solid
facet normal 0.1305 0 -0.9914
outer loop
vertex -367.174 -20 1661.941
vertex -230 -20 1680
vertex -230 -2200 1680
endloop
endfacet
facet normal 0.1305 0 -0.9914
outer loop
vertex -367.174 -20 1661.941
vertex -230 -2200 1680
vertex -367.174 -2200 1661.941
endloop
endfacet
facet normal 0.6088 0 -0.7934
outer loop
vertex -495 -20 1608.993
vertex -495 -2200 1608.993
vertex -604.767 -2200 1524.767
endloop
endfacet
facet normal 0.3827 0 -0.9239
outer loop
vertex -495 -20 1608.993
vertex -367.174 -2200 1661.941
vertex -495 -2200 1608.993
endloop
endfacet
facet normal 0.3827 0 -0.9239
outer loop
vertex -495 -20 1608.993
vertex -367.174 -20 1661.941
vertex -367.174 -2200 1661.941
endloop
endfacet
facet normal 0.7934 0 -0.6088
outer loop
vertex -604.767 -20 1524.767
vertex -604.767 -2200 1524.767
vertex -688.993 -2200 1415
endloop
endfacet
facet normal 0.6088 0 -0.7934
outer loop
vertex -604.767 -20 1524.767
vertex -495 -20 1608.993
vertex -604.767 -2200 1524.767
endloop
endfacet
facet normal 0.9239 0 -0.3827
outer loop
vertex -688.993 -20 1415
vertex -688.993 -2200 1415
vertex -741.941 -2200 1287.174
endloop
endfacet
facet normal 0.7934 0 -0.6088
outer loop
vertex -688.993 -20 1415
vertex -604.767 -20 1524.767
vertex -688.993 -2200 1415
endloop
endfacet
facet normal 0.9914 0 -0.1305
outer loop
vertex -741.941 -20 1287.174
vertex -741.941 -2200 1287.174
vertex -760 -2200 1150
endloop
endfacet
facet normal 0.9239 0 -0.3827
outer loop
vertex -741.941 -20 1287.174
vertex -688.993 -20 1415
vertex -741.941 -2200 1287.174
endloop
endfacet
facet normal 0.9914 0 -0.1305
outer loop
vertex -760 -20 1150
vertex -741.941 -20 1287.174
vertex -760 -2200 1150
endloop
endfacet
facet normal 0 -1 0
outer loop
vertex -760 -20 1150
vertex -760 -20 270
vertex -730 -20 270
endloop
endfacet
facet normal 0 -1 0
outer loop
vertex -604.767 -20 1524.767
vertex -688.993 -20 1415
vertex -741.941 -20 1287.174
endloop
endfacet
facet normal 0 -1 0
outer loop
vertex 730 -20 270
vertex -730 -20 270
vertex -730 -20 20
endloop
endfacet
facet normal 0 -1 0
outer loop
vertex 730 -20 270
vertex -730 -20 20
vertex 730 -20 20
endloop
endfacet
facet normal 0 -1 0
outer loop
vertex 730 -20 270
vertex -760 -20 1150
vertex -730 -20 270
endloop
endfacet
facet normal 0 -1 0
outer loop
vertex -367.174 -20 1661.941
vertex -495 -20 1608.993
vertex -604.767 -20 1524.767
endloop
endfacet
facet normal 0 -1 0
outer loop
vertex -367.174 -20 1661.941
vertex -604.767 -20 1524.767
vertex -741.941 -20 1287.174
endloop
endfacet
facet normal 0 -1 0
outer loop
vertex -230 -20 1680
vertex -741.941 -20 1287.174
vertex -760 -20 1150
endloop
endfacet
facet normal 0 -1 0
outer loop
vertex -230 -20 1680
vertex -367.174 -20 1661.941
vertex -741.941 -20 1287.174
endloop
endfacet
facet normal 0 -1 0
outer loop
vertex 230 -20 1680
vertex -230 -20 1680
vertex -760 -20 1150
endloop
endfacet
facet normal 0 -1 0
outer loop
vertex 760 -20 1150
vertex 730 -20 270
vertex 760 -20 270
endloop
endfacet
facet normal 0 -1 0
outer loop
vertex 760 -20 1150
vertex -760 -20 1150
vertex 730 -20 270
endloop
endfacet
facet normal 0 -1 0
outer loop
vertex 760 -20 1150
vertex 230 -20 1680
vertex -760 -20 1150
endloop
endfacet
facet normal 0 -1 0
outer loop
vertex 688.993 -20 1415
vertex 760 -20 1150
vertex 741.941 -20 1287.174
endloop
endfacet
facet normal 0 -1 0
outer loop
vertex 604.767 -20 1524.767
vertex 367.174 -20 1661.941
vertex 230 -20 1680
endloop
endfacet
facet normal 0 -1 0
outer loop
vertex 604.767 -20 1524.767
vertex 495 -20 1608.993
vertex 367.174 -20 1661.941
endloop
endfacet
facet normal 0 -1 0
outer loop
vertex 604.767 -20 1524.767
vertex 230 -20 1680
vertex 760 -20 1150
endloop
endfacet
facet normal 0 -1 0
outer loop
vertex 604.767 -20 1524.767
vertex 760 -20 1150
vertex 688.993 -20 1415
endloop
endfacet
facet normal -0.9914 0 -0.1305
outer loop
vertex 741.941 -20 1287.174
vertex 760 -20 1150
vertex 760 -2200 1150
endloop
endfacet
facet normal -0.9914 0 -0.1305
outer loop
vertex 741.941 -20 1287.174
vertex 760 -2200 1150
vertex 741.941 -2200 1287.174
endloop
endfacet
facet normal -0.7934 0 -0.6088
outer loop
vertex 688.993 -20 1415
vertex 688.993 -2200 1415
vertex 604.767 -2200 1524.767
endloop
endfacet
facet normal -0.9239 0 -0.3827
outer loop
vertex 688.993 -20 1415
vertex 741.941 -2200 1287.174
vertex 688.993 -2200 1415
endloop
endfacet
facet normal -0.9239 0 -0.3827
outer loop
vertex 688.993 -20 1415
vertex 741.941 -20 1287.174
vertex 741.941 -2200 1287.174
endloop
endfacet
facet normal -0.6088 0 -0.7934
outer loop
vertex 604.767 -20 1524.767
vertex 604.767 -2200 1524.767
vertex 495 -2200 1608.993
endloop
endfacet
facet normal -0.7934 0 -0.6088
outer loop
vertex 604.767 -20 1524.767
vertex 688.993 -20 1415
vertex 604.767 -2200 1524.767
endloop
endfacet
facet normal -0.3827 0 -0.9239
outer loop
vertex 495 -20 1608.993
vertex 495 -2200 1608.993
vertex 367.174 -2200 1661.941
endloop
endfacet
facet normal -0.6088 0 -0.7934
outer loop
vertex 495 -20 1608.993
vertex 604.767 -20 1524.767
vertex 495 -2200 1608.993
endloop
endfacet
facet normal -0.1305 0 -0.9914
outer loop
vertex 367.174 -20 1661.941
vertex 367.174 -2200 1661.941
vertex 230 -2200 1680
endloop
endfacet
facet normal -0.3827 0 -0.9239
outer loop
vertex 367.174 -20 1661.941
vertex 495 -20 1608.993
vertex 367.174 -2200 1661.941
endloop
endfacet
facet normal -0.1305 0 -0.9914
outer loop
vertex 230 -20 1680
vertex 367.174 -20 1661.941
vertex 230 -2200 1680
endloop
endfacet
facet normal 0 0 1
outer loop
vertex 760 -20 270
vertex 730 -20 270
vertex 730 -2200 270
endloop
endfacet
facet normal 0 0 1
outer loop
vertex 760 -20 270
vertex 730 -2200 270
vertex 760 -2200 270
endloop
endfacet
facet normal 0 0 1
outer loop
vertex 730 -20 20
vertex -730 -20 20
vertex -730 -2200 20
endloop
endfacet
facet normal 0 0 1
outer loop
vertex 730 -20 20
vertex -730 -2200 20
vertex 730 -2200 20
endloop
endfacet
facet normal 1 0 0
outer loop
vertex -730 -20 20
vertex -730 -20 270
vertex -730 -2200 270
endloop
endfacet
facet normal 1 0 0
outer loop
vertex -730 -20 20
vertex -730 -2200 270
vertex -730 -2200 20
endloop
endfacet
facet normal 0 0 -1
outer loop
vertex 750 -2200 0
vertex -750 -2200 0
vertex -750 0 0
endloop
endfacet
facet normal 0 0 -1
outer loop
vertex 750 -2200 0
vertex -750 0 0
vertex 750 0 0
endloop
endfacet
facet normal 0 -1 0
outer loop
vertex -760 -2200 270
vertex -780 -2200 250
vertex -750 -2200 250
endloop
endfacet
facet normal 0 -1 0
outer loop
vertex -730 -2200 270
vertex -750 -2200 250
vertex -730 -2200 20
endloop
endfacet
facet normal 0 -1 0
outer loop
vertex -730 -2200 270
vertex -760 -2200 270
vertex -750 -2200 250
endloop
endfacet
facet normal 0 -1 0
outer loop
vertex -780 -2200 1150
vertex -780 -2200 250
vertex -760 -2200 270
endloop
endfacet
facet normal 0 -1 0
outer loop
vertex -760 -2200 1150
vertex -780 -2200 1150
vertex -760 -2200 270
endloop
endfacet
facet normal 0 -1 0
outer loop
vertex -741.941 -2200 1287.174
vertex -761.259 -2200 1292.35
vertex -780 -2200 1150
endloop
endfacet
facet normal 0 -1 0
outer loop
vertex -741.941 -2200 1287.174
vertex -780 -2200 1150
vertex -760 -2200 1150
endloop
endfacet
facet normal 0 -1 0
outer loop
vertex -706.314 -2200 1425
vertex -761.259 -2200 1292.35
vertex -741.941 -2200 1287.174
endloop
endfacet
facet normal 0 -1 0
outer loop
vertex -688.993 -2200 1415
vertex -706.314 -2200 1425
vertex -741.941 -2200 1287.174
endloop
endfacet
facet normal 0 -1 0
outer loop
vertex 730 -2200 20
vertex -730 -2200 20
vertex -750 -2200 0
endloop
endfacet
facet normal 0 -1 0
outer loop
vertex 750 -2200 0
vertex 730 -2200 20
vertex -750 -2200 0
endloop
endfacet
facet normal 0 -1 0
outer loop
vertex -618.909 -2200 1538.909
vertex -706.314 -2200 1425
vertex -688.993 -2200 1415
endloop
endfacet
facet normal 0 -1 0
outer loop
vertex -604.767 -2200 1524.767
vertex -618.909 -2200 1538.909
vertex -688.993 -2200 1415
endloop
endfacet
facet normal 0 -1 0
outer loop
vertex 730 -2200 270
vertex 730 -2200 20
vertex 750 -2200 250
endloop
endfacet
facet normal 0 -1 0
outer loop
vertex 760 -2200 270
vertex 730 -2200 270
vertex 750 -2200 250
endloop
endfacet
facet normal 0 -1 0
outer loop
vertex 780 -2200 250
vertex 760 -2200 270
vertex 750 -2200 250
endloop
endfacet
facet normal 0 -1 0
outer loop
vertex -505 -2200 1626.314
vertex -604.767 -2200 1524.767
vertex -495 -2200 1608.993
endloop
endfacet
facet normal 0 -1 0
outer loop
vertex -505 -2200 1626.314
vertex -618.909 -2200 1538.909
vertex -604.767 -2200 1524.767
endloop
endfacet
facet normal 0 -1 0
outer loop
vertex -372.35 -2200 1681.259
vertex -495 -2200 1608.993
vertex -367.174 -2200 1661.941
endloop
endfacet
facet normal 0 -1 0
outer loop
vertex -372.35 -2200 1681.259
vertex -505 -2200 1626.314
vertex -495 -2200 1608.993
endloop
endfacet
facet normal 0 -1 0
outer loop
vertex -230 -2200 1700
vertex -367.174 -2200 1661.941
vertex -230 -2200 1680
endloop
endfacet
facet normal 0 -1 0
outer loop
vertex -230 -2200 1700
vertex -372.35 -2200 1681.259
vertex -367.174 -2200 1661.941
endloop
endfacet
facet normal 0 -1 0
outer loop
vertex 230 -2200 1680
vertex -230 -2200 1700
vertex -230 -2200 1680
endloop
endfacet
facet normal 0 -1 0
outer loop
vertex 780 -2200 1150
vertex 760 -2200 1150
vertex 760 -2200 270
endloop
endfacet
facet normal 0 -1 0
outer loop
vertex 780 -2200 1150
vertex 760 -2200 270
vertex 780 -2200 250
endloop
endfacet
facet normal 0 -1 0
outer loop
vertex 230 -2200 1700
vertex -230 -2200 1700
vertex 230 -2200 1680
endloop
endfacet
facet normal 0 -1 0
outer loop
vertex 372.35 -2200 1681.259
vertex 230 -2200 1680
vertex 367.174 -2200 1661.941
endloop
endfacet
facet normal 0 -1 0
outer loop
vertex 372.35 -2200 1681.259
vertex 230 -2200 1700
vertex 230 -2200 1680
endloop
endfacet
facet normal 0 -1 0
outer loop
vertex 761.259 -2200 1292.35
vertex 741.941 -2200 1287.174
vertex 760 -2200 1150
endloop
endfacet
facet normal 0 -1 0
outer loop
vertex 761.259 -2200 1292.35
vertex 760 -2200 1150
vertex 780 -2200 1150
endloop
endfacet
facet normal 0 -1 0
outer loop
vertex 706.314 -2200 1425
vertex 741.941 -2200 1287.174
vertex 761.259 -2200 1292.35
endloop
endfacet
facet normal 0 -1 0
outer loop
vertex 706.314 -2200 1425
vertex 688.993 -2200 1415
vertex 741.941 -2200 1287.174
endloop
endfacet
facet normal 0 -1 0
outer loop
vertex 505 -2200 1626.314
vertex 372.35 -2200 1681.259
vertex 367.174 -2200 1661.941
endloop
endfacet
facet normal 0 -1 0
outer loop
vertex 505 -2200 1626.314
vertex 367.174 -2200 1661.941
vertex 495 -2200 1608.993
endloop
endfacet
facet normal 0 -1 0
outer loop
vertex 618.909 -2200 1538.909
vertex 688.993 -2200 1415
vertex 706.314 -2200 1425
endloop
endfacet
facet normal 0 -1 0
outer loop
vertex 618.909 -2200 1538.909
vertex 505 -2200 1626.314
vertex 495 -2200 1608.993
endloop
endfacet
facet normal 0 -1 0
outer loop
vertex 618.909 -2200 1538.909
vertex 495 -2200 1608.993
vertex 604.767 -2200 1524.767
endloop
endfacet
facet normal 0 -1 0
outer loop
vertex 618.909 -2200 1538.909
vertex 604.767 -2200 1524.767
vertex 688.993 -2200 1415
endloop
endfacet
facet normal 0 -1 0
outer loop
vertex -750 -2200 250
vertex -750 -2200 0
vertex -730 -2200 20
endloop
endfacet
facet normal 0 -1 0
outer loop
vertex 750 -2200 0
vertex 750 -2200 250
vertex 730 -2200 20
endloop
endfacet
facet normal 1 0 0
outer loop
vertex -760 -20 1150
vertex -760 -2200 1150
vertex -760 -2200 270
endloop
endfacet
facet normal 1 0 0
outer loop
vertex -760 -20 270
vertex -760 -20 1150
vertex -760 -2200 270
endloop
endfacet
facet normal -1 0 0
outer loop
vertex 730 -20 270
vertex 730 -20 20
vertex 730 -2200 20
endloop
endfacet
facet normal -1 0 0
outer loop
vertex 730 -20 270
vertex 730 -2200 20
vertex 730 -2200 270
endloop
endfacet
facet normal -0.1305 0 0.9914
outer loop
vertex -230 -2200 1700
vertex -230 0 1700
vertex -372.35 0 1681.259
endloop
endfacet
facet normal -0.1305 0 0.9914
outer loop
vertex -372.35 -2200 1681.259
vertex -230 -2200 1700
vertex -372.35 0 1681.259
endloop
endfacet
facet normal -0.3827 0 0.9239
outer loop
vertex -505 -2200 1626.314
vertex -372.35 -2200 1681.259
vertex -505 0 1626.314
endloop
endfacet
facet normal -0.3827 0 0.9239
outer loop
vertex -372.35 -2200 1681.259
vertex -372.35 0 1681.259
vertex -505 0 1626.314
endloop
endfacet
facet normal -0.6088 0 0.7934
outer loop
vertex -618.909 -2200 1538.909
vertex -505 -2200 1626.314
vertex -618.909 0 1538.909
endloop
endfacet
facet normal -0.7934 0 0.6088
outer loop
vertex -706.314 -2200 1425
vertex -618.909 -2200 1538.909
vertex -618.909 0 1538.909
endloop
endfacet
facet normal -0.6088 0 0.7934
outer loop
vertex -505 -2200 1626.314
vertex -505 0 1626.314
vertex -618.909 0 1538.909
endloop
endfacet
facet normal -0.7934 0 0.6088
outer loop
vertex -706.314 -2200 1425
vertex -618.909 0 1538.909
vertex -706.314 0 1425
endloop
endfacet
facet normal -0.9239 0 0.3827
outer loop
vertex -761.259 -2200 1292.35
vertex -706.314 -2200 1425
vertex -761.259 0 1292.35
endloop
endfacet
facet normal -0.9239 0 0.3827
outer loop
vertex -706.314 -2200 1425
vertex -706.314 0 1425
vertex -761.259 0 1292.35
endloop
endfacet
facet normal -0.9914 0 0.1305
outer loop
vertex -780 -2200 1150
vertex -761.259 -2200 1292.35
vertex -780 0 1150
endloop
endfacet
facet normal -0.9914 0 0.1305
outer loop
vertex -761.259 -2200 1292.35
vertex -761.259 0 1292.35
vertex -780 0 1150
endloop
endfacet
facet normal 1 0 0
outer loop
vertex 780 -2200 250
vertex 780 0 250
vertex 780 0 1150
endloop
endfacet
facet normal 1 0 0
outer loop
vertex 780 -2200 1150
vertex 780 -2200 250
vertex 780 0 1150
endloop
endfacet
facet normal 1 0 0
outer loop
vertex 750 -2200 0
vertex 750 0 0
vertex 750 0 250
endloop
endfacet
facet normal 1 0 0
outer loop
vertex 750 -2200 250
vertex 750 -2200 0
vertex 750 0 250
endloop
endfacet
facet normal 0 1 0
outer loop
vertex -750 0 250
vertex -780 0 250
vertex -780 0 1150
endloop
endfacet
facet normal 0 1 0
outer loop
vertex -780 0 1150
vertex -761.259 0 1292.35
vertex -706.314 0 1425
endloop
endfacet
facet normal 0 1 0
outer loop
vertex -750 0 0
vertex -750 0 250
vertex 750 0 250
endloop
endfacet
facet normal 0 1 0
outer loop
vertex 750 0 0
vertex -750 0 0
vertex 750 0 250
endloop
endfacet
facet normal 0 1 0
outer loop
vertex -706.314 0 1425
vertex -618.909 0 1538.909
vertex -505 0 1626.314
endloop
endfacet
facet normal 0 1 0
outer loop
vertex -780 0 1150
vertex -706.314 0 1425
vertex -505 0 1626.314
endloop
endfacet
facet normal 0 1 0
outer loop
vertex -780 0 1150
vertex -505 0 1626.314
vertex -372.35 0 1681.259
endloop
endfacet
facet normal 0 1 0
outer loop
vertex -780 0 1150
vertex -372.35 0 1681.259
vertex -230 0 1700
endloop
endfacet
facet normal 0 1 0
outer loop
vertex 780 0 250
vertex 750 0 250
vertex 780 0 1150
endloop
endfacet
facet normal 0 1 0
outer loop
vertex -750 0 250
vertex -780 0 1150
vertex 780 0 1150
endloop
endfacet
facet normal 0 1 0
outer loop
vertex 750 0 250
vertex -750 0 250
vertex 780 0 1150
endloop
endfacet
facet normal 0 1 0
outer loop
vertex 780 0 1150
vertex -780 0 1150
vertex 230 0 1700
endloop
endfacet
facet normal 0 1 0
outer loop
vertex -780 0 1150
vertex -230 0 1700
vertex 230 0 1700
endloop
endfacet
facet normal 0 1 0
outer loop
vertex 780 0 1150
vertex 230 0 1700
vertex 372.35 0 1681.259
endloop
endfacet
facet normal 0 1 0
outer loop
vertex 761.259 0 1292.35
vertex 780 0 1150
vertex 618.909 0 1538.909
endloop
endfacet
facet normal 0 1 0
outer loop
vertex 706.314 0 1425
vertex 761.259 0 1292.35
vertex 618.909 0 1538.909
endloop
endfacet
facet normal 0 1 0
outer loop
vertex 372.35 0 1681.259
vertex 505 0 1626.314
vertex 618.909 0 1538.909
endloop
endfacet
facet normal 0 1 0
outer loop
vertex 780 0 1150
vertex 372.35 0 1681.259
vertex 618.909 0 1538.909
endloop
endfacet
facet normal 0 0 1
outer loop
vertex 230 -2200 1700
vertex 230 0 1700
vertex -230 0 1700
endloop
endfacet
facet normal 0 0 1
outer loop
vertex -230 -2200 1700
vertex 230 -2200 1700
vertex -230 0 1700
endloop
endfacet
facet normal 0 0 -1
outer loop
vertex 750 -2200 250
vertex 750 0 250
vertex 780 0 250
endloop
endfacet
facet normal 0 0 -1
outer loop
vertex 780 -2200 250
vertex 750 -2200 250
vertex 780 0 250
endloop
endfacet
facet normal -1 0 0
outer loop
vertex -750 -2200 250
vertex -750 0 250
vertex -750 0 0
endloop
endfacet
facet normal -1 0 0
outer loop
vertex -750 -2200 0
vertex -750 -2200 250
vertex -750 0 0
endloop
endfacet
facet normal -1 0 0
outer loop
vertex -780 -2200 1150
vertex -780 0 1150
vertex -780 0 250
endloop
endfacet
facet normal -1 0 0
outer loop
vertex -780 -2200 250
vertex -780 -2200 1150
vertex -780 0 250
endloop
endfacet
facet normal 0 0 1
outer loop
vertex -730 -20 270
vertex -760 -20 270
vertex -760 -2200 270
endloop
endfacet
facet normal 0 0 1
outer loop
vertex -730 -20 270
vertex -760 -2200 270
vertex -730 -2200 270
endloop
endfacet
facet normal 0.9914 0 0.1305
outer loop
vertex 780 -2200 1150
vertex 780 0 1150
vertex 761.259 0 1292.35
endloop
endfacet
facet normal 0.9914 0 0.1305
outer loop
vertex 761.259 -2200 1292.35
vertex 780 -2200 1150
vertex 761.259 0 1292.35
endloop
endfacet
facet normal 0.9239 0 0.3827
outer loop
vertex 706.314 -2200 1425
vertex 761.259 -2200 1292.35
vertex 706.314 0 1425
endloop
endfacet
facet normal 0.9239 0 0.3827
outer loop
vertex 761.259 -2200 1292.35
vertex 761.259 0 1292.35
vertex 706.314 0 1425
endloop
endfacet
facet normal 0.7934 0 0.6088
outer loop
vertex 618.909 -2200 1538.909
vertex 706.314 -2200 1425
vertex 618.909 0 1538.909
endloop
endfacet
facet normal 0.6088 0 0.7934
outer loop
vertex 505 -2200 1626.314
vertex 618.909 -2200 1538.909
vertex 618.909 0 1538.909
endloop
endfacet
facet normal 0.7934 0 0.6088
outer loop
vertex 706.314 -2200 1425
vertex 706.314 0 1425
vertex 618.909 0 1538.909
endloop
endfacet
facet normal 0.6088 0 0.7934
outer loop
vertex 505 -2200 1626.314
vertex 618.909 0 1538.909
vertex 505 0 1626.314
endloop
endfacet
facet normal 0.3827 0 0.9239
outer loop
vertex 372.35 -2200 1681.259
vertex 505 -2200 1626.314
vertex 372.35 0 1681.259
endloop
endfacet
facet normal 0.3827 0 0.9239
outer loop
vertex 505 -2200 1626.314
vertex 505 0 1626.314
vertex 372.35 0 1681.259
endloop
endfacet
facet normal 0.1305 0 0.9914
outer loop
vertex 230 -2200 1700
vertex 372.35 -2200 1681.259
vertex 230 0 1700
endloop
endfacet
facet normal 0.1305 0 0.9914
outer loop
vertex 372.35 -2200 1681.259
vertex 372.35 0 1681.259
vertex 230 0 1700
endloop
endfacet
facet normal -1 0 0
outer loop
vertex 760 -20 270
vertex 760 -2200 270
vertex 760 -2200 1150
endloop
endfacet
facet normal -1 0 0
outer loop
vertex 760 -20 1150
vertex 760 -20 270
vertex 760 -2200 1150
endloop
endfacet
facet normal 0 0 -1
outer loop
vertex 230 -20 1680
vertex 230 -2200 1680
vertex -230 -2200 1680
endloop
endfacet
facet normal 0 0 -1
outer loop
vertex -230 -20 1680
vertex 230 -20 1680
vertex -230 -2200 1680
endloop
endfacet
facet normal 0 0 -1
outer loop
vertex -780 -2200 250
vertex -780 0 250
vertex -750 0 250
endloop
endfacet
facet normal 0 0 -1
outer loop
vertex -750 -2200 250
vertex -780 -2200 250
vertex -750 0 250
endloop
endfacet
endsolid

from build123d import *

# Parameters (mm, degrees)
F1_DEPTH = 2200
F2_T     = -20


with BuildPart() as f1:
    # F0 (on Front) → F1 (new body)
    with BuildSketch(Plane.XZ):
        with BuildLine():
            Line((-750, 250), (-750, 0))
            Line((-750, 0), (750, 0))
            Line((750, 0), (750, 250))
            Line((750, 250), (780, 250))
            Line((780, 250), (780, 1150))
            ThreePointArc((780, 1150), (618.9087296526, 1538.9087296526), (230, 1700))
            Line((230, 1700), (-230, 1700))
            ThreePointArc((-230, 1700), (-618.9087296526, 1538.9087296526), (-780, 1150))
            Line((-780, 1150), (-780, 250))
            Line((-780, 250), (-750, 250))
        make_face()
    extrude(amount=F1_DEPTH)

    # F2
    f2_openings = [f1.faces().sort_by_distance(p)[0] for p in [
        (0, -2200, 816.682074),
    ]]
    offset(amount=F2_T, openings=f2_openings, kind=Kind.INTERSECTION)


solid = f1.part
